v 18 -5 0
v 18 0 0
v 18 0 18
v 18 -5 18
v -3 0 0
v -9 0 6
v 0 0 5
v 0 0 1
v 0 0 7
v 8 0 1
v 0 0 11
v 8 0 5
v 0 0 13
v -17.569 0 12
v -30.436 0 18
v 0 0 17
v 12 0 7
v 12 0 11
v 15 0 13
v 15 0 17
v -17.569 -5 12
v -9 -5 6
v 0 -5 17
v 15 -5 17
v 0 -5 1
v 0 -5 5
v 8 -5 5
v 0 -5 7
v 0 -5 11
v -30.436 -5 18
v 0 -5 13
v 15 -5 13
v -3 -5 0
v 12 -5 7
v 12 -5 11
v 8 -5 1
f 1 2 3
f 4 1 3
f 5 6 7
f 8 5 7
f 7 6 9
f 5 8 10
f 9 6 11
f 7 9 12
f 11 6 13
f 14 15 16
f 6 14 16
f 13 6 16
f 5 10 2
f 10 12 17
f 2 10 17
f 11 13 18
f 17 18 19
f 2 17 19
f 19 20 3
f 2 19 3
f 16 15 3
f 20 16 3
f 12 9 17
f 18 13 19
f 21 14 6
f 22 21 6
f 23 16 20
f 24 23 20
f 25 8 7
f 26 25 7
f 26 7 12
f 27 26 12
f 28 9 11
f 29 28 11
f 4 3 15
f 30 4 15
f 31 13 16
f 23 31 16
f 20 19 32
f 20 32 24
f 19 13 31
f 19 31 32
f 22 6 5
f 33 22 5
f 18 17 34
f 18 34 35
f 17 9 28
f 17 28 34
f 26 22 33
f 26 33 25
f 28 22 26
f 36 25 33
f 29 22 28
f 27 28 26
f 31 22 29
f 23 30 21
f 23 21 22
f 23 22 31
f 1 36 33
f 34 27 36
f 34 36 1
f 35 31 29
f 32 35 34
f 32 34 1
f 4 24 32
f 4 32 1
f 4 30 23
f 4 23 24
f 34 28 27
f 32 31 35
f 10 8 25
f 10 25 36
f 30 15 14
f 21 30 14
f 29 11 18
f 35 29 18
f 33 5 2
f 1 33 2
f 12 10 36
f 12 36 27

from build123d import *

# Parameters (mm, degrees)
F0_W     = 8
F0_H     = 4
F0_W_2   = 12
F0_W_3   = 15
F1_DEPTH = 5


with BuildPart() as f1:
    # F0 (on Front) → F1 (new body)
    with BuildSketch(Plane.XZ):
        Polygon((-3, 0), (0, 0), (18, 0), (18, 18), (0, 18), (-30.43593, 18), (-17.568888, 12), (-9, 6), align=None)
        with Locations((4, 3)):
            Rectangle(F0_W, F0_H, mode=Mode.SUBTRACT)
        with Locations((6, 9)):
            Rectangle(F0_W_2, F0_H, mode=Mode.SUBTRACT)
        with Locations((7.5, 15)):
            Rectangle(F0_W_3, F0_H, mode=Mode.SUBTRACT)
    extrude(amount=F1_DEPTH)


solid = f1.part
